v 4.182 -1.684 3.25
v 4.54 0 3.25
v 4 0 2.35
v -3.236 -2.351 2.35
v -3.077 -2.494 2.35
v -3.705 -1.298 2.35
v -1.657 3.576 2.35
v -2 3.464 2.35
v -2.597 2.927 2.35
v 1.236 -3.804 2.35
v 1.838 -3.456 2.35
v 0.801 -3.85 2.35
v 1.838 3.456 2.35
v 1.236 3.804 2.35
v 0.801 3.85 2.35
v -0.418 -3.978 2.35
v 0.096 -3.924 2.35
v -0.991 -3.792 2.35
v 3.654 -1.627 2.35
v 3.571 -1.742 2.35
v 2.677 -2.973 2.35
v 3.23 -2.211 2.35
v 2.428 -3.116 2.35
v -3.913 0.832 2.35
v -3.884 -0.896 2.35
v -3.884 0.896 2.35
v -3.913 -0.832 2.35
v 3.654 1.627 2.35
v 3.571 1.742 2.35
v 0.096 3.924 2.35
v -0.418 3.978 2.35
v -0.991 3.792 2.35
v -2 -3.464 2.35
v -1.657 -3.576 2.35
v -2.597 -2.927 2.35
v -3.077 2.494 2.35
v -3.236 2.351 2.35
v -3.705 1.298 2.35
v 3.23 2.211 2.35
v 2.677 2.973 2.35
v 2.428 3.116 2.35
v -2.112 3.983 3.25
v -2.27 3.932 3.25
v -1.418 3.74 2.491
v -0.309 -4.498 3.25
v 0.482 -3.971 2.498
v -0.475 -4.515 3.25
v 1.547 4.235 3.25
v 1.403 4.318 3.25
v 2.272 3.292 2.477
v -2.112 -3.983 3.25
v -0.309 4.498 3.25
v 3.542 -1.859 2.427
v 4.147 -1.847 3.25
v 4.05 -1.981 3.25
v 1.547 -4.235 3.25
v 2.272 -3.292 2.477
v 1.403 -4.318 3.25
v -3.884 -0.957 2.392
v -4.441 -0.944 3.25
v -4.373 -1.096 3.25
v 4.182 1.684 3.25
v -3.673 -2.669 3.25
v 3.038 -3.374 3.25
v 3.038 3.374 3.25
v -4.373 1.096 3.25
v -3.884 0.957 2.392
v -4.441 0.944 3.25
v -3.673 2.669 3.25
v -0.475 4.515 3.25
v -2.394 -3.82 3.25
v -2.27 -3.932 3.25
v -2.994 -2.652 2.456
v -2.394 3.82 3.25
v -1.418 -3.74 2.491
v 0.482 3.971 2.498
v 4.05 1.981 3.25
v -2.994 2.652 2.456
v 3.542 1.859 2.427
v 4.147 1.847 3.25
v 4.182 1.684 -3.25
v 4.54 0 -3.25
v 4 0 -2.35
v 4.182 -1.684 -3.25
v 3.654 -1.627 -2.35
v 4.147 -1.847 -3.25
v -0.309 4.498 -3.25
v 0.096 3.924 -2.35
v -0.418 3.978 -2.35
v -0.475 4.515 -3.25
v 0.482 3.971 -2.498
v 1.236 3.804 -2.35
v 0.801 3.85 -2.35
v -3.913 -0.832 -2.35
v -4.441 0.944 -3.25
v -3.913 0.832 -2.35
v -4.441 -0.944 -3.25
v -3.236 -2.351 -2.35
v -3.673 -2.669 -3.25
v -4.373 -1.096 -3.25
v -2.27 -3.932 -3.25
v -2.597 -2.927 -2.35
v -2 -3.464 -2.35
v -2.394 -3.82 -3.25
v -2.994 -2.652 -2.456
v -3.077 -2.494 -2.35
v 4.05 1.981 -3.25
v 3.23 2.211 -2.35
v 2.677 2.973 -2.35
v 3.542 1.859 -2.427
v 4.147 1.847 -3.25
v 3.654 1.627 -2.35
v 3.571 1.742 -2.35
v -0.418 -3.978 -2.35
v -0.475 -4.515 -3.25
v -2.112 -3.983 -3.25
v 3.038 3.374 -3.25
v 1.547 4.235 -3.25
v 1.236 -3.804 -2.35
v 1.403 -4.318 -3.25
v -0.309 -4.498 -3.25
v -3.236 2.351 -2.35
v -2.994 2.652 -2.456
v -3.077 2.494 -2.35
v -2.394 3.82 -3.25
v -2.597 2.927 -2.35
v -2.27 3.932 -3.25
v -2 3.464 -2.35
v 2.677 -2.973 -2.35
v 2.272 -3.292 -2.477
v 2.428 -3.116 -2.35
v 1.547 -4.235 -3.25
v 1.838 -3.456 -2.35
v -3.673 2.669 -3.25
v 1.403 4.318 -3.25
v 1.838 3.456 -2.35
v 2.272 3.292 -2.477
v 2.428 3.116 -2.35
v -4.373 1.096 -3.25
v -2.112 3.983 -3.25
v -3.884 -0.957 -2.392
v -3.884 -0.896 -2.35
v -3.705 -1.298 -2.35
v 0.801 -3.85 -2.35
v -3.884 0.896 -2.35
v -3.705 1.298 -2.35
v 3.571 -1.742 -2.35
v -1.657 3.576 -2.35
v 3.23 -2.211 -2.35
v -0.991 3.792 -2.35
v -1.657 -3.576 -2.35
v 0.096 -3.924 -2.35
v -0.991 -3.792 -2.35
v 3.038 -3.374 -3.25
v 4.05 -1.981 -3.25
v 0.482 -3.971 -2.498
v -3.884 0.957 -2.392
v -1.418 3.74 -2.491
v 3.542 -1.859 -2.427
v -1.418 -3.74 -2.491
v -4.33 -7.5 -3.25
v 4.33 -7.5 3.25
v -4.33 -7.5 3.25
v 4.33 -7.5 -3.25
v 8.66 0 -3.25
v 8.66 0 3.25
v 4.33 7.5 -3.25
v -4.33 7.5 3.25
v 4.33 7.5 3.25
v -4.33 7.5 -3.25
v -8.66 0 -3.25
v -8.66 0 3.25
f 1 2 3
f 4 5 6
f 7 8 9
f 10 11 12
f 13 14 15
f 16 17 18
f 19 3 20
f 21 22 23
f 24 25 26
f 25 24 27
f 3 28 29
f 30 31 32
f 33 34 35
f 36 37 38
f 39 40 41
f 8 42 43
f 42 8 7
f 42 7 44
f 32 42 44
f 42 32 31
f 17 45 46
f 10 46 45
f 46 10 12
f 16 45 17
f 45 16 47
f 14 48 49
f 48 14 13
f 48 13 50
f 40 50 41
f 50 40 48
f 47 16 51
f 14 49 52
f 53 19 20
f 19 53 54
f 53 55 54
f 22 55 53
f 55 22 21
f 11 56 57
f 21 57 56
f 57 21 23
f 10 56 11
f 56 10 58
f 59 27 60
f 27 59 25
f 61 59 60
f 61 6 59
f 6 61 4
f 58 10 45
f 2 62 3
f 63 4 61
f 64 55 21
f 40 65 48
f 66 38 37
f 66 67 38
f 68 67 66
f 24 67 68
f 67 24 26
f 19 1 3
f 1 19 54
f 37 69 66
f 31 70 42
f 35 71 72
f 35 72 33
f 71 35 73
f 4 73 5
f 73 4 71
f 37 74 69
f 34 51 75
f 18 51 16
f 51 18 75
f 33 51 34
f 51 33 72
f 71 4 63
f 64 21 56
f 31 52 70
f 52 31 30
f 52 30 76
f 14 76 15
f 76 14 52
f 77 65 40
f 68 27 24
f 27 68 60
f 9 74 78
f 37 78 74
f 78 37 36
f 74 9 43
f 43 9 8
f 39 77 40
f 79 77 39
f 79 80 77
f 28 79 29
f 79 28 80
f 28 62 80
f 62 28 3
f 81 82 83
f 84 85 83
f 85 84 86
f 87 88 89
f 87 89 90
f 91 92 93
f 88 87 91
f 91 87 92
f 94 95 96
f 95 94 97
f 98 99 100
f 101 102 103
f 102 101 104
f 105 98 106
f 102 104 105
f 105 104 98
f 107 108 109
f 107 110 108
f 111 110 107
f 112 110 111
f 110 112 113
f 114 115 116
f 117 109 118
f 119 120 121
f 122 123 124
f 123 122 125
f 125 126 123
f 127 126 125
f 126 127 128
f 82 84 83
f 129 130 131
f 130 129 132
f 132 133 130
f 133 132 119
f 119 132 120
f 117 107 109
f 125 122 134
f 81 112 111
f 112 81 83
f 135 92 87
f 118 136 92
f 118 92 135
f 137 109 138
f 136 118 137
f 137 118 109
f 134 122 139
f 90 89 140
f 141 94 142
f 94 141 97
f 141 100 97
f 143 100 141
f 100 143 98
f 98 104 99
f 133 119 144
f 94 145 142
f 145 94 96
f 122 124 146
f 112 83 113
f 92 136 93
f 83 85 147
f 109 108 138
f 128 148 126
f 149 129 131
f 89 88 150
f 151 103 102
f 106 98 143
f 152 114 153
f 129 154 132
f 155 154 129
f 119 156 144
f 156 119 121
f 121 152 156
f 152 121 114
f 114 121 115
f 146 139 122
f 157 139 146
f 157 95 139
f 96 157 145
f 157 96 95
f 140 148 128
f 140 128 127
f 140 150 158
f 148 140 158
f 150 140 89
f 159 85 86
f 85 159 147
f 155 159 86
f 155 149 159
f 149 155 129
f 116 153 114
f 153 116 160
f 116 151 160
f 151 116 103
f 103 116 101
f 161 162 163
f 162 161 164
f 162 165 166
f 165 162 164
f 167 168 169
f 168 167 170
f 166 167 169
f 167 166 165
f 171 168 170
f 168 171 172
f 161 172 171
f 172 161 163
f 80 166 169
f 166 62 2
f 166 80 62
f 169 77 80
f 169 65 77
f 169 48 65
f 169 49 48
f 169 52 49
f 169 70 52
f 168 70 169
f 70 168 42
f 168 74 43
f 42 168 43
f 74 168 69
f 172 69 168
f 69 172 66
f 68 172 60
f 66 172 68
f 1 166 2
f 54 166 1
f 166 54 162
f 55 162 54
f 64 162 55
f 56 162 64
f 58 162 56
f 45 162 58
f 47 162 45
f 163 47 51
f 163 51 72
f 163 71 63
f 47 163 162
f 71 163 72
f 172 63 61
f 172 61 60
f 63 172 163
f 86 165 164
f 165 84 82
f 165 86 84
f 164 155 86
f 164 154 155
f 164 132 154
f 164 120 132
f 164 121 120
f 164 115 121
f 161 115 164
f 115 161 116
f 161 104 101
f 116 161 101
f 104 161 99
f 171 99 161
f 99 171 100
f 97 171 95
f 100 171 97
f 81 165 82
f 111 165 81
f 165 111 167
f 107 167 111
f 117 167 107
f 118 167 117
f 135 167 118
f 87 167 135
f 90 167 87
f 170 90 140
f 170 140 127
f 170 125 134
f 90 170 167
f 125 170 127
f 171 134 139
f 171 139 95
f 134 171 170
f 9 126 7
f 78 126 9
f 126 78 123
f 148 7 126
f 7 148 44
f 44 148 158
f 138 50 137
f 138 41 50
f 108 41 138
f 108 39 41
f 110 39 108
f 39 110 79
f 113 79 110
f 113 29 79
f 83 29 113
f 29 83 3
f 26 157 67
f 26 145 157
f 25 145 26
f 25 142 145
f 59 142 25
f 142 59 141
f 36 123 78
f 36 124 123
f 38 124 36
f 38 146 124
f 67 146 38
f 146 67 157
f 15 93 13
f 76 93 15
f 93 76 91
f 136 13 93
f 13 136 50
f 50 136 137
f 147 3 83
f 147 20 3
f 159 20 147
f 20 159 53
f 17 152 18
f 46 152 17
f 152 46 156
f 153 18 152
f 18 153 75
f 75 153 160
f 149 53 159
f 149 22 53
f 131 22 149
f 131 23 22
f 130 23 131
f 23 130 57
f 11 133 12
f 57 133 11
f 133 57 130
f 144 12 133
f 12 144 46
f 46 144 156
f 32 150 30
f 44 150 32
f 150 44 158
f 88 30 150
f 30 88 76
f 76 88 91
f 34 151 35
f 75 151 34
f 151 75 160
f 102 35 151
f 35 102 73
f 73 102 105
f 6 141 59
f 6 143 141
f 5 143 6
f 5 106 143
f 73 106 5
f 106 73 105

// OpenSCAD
// Parameters
thread_nominal_diameter_mm = 8.0; //[4.0:16.0:0.1]
across_flats_mm = 15.0; //[7.5:30.0:0.1]
thickness_mm = 6.5; //[3.25:13.0:0.1]
hole_diameter_mm = 8.0; //[4.0:16.0:0.05]
chamfer_height_mm = 0.8; //[0.4:1.6:0.05]
chamfer_radial_mm = 0.6; //[0.3:1.2:0.05]
eps_mm = 0.2; //[0.05:0.5:0.05]
outer_profile = 6; //[6:6:1]

// Hex Nut - complete geometry
module nut_and_washer() {
  color("DimGray") {
    difference() {
      // Hex Nut Body
      cylinder(h=thickness_mm, r=across_flats_mm/(2*cos(30)), $fn=outer_profile, center=true);
      
      // Central Through Hole
      cylinder(h=thickness_mm + 2*eps_mm, r=hole_diameter_mm/2, center=true);
      
      // Edge Chamfers or Lead-in
      union() {
        // Top Cone
        translate([0, 0, thickness_mm/2 - (chamfer_height_mm + eps_mm)/2 + eps_mm/2])
          rotate([180, 0, 0])
          cylinder(h=chamfer_height_mm + eps_mm, r1=hole_diameter_mm/2 + chamfer_radial_mm, r2=hole_diameter_mm/2, center=true);
        
        // Bottom Cone
        translate([0, 0, -thickness_mm/2 + (chamfer_height_mm + eps_mm)/2 - eps_mm/2])
          cylinder(h=chamfer_height_mm + eps_mm, r1=hole_diameter_mm/2 + chamfer_radial_mm, r2=hole_diameter_mm/2, center=true);
      }
    }
  }
}

// Assembly
module assembly() {
  nut_and_washer();
}

assembly();
